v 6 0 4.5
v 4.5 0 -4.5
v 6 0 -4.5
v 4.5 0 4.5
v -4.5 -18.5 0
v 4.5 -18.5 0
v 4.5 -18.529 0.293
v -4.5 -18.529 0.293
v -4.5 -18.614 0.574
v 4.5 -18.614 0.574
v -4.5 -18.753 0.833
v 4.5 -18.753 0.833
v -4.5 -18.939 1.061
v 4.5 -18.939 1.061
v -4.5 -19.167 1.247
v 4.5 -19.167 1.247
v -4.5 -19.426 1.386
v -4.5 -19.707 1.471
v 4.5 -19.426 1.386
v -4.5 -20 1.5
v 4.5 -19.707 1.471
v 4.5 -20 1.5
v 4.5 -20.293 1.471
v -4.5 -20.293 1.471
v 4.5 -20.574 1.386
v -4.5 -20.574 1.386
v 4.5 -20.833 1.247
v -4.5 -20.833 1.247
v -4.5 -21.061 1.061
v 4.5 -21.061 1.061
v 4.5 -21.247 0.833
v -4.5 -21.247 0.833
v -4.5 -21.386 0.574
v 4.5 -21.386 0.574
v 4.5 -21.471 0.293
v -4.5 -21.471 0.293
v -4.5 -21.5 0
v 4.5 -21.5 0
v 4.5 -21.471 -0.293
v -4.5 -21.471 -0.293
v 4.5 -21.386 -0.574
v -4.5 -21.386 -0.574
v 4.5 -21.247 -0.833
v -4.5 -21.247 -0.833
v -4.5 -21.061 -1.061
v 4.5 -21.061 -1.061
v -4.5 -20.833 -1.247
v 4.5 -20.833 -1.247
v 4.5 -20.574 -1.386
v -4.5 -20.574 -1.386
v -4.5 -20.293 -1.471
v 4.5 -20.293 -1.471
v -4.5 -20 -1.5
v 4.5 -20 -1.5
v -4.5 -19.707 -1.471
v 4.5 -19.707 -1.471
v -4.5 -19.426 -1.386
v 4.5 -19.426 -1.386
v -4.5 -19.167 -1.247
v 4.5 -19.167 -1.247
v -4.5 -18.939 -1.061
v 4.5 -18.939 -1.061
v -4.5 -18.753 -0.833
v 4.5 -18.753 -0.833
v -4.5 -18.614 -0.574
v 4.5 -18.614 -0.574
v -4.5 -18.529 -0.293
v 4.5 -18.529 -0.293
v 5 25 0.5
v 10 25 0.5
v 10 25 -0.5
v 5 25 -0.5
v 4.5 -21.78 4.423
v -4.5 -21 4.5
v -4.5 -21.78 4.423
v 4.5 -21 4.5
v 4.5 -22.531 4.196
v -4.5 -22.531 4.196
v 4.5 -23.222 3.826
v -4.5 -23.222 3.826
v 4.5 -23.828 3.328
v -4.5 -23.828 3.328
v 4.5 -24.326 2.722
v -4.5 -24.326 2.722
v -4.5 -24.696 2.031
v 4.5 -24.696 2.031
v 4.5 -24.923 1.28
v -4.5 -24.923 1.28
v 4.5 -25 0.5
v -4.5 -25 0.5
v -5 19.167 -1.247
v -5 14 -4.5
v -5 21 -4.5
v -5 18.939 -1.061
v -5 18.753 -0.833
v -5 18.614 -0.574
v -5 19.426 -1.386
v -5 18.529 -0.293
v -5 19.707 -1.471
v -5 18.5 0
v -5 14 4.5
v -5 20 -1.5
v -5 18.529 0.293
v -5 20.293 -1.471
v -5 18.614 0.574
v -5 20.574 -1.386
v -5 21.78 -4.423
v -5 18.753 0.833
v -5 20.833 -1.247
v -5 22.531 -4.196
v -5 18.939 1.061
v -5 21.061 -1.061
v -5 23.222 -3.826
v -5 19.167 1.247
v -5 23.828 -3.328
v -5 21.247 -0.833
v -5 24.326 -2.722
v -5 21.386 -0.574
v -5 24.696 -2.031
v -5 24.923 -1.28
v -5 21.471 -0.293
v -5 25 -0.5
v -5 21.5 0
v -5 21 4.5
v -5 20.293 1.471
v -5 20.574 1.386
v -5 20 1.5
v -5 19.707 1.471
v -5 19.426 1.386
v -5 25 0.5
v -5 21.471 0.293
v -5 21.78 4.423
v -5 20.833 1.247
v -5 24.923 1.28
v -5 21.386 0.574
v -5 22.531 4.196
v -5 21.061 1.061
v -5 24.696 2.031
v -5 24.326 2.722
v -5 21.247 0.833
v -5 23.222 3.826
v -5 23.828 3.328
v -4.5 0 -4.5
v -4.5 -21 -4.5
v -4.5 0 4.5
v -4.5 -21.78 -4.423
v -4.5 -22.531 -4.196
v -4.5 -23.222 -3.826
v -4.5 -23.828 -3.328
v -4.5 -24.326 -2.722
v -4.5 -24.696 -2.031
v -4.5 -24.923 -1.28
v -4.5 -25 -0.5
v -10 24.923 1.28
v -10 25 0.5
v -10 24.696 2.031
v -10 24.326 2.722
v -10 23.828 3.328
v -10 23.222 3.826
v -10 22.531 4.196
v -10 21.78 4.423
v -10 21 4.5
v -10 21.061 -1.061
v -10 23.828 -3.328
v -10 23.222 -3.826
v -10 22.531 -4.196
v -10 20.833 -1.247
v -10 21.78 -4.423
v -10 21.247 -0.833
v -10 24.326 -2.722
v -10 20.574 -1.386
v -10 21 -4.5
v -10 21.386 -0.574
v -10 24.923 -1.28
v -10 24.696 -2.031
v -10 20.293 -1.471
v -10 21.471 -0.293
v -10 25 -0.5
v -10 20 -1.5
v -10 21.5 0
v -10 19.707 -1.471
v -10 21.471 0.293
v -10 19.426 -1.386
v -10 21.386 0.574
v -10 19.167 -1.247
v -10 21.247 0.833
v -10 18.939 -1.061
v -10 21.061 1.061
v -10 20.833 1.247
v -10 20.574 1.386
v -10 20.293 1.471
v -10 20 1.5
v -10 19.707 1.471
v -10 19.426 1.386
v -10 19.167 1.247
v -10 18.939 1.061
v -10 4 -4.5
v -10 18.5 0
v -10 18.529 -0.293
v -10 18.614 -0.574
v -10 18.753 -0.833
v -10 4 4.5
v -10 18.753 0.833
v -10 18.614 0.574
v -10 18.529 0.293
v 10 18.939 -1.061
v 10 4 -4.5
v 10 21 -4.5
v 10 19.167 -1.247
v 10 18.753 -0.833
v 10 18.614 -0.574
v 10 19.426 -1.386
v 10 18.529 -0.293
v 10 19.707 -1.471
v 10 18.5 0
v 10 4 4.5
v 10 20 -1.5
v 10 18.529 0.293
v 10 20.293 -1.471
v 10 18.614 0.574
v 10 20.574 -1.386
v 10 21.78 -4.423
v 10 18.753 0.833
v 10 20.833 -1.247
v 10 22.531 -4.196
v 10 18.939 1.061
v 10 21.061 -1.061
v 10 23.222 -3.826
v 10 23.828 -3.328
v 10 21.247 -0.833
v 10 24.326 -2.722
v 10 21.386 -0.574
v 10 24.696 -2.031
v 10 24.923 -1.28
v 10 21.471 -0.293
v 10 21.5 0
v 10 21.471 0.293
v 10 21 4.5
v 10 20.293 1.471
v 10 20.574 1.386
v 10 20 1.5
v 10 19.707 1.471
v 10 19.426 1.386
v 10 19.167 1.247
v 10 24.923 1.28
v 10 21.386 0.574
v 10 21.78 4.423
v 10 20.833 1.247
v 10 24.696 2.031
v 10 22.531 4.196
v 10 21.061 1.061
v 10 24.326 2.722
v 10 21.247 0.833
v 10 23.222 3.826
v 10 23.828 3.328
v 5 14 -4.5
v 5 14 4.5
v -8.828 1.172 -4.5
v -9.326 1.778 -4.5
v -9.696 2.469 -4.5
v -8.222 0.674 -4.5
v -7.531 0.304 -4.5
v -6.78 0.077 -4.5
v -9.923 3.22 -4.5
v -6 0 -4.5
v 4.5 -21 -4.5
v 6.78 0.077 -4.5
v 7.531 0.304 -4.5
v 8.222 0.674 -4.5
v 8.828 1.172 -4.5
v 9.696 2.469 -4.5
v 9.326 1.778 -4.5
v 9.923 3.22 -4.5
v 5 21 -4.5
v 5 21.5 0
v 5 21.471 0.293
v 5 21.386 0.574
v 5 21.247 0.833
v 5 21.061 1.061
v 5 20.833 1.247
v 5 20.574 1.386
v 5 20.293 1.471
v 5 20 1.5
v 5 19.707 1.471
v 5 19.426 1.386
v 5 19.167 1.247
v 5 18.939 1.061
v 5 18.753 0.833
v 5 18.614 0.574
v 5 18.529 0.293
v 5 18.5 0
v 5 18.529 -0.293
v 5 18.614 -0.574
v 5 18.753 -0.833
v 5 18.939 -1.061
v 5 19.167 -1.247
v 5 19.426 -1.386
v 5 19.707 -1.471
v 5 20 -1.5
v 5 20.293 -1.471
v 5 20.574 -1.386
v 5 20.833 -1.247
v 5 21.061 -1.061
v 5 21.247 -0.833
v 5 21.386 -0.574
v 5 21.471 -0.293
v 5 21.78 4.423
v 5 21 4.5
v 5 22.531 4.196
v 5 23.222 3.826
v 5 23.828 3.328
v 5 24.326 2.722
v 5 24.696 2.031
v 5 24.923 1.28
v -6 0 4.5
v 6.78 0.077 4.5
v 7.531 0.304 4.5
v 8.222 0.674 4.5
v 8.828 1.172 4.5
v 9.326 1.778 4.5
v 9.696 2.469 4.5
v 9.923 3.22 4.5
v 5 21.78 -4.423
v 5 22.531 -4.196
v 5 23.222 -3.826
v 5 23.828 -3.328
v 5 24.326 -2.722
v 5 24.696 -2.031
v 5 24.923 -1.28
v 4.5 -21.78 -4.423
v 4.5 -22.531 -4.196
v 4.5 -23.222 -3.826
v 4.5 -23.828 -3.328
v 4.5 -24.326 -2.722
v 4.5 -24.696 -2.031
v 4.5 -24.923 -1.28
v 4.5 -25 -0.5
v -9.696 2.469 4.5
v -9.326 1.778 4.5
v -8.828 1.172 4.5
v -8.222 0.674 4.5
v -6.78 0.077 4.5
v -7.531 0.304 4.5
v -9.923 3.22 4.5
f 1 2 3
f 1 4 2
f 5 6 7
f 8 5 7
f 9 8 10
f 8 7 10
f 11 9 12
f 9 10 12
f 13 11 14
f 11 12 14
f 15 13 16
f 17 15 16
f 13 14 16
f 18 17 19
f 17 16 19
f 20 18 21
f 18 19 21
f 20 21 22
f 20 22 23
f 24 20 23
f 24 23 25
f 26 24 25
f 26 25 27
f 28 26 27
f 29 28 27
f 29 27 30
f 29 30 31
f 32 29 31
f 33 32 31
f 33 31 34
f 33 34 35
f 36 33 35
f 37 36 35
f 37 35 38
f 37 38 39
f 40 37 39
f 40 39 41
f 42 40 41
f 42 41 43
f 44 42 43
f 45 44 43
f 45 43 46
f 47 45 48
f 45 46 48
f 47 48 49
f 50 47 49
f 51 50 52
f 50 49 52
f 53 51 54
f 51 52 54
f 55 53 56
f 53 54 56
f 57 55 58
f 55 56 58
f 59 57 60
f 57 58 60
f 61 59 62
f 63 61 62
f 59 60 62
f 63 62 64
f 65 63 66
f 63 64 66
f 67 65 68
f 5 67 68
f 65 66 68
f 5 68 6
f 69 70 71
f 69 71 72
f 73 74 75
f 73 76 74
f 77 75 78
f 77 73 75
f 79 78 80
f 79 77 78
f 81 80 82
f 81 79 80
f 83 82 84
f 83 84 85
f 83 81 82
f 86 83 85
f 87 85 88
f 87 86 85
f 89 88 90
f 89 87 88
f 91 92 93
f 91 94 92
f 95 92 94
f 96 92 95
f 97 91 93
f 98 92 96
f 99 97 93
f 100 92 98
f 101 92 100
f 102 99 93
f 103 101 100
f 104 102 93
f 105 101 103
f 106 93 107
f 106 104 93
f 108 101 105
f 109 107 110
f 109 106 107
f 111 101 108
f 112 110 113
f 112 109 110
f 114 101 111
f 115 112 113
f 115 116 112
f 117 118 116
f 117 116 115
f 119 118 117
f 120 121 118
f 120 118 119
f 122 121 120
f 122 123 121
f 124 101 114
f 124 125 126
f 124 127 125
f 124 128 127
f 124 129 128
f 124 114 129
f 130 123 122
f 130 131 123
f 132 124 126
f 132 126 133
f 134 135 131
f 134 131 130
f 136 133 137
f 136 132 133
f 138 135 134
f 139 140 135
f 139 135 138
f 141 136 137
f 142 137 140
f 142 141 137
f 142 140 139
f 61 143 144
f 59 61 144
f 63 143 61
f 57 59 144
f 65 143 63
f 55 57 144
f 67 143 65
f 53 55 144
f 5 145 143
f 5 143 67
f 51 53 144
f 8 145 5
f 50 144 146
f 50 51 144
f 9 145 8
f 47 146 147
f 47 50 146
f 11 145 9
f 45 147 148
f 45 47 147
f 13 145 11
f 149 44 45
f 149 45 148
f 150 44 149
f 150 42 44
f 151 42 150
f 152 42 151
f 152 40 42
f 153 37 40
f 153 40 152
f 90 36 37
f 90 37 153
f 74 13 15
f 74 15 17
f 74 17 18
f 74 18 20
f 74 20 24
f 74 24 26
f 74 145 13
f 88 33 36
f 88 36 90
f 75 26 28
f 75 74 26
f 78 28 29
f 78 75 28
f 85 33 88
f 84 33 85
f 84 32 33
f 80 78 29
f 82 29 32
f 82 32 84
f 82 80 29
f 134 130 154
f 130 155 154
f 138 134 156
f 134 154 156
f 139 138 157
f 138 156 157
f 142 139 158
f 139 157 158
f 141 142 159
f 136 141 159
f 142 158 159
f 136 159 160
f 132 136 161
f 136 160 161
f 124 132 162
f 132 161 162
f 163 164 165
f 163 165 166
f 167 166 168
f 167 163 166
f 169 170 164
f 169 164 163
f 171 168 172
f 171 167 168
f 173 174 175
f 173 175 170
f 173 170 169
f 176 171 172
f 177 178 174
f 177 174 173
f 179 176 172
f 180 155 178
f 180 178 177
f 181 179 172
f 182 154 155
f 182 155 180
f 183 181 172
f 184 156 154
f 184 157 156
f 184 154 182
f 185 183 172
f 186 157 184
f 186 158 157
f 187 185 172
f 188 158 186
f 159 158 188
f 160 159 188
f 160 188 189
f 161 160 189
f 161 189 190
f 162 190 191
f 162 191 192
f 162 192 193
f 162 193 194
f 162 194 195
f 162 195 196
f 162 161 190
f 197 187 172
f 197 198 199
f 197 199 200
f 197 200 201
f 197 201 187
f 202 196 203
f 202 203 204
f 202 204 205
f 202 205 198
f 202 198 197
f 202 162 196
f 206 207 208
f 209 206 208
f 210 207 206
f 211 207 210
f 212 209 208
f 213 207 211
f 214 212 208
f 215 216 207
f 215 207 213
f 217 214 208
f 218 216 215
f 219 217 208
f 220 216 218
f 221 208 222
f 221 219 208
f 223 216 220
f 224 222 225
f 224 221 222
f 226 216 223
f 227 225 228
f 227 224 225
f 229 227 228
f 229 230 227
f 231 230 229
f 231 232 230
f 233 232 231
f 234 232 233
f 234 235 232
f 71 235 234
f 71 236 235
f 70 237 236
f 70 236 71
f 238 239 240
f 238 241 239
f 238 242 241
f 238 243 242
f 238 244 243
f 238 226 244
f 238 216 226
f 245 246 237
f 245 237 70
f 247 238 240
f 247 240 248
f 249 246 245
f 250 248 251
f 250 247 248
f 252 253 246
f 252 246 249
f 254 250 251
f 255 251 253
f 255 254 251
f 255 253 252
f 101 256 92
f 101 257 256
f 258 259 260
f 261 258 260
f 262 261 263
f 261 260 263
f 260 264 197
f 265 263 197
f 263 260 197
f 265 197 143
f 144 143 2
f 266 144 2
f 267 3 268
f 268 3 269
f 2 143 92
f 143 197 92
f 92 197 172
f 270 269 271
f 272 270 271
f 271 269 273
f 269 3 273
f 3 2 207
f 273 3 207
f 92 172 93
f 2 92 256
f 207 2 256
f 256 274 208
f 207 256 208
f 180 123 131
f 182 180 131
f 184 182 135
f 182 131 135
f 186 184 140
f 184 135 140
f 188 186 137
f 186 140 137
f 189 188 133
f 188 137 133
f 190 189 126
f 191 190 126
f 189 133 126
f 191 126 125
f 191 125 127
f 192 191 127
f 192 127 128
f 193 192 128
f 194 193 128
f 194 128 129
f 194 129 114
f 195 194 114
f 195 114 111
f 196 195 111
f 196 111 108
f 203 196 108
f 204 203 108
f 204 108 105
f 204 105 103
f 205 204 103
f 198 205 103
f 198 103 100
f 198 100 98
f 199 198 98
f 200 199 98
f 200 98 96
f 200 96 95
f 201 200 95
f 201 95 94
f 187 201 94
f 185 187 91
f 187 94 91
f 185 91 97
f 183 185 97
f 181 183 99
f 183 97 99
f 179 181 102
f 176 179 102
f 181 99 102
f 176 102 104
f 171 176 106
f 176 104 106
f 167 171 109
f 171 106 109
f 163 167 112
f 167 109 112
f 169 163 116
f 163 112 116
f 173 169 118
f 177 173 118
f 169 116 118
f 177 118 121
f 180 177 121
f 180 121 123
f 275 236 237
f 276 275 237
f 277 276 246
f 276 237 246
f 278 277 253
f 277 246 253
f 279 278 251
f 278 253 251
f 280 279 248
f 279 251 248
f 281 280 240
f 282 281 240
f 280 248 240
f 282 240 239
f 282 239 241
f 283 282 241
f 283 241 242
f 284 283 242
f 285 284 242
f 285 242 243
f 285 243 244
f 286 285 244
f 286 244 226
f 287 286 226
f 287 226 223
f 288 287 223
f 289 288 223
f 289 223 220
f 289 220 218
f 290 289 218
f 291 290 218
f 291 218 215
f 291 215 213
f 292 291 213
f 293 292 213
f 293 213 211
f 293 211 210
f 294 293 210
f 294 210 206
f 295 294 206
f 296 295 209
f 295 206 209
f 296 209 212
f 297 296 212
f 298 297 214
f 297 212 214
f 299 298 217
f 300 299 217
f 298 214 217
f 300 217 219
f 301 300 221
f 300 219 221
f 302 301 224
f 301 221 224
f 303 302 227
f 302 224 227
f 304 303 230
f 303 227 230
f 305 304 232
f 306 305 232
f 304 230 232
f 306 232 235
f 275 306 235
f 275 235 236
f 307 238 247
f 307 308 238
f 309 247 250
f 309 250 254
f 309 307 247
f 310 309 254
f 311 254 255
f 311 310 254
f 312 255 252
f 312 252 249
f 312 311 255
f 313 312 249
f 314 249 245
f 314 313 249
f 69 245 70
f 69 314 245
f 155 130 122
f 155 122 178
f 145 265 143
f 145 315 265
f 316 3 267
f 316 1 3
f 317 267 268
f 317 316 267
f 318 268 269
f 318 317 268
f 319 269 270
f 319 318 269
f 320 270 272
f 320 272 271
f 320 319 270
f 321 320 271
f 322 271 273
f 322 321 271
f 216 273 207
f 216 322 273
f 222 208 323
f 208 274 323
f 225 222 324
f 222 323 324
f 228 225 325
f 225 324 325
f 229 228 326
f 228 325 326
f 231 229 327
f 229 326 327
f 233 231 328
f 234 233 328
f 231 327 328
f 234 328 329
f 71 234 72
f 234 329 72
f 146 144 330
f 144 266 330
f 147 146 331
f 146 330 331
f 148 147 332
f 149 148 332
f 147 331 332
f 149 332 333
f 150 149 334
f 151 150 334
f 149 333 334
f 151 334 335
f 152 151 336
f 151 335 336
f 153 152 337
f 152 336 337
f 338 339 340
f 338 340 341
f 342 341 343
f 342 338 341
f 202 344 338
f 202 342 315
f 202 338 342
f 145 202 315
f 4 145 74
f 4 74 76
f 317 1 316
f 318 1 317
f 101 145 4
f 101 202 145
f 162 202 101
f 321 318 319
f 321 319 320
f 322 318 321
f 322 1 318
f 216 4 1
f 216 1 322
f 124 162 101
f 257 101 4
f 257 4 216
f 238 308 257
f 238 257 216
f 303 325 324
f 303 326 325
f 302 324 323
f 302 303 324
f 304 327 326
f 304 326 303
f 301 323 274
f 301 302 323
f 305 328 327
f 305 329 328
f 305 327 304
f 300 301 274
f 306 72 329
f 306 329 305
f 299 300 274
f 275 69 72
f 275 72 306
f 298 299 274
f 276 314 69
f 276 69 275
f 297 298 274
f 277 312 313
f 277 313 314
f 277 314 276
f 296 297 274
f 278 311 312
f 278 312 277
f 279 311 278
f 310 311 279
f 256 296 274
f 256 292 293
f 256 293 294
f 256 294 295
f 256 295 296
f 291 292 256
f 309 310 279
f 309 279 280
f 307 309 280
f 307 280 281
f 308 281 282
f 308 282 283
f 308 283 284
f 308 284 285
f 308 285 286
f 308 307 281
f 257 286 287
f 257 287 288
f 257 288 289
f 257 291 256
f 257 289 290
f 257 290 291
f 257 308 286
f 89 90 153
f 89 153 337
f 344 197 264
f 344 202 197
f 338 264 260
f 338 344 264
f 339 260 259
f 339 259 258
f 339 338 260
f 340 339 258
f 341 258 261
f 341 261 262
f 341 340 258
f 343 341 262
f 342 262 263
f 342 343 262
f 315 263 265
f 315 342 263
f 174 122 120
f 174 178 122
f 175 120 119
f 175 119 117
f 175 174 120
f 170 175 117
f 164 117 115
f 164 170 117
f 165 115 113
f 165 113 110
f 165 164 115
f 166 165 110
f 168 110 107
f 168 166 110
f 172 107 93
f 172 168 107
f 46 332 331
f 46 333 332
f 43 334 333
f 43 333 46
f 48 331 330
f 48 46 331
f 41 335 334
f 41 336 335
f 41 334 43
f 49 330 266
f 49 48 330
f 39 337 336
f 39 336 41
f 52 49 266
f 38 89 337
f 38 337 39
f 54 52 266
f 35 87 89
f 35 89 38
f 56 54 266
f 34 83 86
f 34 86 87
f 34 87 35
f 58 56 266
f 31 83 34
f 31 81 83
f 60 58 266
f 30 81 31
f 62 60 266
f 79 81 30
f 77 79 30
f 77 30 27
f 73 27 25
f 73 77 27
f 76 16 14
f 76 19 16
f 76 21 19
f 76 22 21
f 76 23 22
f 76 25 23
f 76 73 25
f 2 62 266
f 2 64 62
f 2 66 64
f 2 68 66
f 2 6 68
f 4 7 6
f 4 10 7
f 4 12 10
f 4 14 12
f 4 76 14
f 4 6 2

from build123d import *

# Parameters (mm, degrees)
F1_DEPTH = 4.5
F2_R     = 1.5
F3_DEPTH = 20.001
F4_R     = 4


with BuildPart() as f1:
    # F0 (on Top) → F1 (new body, symmetric)
    with BuildSketch(Plane.XY):
        Polygon((-5, 25), (-10, 25), (-10, 0), (-4.5, 0), (-4.5, -25), (4.5, -25), (4.5, 0), (10, 0), (10, 25), (5, 25), (5, 14), (-5, 14), align=None)
    extrude(amount=F1_DEPTH, both=True)

    # F2 (on face) → F3 (cut, through all)
    with BuildSketch(Plane.YZ.offset(10)):
        with Locations((20, 0)):
            Circle(F2_R)
        with Locations((-20, 0)):
            Circle(F2_R)
    extrude(amount=-F3_DEPTH, mode=Mode.SUBTRACT)

    # F4
    f4_edges = [f1.edges().sort_by_distance(p)[0] for p in [
        (-7.5, 25, 4.5),
        (10, 0, 0),
        (-10, 0, 0),
        (0, -25, 4.5),
        (0, -25, -4.5),
        (-7.5, 25, -4.5),
        (7.5, 25, -4.5),
        (7.5, 25, 4.5),
    ]]
    fillet(f4_edges, radius=F4_R)


solid = f1.part
